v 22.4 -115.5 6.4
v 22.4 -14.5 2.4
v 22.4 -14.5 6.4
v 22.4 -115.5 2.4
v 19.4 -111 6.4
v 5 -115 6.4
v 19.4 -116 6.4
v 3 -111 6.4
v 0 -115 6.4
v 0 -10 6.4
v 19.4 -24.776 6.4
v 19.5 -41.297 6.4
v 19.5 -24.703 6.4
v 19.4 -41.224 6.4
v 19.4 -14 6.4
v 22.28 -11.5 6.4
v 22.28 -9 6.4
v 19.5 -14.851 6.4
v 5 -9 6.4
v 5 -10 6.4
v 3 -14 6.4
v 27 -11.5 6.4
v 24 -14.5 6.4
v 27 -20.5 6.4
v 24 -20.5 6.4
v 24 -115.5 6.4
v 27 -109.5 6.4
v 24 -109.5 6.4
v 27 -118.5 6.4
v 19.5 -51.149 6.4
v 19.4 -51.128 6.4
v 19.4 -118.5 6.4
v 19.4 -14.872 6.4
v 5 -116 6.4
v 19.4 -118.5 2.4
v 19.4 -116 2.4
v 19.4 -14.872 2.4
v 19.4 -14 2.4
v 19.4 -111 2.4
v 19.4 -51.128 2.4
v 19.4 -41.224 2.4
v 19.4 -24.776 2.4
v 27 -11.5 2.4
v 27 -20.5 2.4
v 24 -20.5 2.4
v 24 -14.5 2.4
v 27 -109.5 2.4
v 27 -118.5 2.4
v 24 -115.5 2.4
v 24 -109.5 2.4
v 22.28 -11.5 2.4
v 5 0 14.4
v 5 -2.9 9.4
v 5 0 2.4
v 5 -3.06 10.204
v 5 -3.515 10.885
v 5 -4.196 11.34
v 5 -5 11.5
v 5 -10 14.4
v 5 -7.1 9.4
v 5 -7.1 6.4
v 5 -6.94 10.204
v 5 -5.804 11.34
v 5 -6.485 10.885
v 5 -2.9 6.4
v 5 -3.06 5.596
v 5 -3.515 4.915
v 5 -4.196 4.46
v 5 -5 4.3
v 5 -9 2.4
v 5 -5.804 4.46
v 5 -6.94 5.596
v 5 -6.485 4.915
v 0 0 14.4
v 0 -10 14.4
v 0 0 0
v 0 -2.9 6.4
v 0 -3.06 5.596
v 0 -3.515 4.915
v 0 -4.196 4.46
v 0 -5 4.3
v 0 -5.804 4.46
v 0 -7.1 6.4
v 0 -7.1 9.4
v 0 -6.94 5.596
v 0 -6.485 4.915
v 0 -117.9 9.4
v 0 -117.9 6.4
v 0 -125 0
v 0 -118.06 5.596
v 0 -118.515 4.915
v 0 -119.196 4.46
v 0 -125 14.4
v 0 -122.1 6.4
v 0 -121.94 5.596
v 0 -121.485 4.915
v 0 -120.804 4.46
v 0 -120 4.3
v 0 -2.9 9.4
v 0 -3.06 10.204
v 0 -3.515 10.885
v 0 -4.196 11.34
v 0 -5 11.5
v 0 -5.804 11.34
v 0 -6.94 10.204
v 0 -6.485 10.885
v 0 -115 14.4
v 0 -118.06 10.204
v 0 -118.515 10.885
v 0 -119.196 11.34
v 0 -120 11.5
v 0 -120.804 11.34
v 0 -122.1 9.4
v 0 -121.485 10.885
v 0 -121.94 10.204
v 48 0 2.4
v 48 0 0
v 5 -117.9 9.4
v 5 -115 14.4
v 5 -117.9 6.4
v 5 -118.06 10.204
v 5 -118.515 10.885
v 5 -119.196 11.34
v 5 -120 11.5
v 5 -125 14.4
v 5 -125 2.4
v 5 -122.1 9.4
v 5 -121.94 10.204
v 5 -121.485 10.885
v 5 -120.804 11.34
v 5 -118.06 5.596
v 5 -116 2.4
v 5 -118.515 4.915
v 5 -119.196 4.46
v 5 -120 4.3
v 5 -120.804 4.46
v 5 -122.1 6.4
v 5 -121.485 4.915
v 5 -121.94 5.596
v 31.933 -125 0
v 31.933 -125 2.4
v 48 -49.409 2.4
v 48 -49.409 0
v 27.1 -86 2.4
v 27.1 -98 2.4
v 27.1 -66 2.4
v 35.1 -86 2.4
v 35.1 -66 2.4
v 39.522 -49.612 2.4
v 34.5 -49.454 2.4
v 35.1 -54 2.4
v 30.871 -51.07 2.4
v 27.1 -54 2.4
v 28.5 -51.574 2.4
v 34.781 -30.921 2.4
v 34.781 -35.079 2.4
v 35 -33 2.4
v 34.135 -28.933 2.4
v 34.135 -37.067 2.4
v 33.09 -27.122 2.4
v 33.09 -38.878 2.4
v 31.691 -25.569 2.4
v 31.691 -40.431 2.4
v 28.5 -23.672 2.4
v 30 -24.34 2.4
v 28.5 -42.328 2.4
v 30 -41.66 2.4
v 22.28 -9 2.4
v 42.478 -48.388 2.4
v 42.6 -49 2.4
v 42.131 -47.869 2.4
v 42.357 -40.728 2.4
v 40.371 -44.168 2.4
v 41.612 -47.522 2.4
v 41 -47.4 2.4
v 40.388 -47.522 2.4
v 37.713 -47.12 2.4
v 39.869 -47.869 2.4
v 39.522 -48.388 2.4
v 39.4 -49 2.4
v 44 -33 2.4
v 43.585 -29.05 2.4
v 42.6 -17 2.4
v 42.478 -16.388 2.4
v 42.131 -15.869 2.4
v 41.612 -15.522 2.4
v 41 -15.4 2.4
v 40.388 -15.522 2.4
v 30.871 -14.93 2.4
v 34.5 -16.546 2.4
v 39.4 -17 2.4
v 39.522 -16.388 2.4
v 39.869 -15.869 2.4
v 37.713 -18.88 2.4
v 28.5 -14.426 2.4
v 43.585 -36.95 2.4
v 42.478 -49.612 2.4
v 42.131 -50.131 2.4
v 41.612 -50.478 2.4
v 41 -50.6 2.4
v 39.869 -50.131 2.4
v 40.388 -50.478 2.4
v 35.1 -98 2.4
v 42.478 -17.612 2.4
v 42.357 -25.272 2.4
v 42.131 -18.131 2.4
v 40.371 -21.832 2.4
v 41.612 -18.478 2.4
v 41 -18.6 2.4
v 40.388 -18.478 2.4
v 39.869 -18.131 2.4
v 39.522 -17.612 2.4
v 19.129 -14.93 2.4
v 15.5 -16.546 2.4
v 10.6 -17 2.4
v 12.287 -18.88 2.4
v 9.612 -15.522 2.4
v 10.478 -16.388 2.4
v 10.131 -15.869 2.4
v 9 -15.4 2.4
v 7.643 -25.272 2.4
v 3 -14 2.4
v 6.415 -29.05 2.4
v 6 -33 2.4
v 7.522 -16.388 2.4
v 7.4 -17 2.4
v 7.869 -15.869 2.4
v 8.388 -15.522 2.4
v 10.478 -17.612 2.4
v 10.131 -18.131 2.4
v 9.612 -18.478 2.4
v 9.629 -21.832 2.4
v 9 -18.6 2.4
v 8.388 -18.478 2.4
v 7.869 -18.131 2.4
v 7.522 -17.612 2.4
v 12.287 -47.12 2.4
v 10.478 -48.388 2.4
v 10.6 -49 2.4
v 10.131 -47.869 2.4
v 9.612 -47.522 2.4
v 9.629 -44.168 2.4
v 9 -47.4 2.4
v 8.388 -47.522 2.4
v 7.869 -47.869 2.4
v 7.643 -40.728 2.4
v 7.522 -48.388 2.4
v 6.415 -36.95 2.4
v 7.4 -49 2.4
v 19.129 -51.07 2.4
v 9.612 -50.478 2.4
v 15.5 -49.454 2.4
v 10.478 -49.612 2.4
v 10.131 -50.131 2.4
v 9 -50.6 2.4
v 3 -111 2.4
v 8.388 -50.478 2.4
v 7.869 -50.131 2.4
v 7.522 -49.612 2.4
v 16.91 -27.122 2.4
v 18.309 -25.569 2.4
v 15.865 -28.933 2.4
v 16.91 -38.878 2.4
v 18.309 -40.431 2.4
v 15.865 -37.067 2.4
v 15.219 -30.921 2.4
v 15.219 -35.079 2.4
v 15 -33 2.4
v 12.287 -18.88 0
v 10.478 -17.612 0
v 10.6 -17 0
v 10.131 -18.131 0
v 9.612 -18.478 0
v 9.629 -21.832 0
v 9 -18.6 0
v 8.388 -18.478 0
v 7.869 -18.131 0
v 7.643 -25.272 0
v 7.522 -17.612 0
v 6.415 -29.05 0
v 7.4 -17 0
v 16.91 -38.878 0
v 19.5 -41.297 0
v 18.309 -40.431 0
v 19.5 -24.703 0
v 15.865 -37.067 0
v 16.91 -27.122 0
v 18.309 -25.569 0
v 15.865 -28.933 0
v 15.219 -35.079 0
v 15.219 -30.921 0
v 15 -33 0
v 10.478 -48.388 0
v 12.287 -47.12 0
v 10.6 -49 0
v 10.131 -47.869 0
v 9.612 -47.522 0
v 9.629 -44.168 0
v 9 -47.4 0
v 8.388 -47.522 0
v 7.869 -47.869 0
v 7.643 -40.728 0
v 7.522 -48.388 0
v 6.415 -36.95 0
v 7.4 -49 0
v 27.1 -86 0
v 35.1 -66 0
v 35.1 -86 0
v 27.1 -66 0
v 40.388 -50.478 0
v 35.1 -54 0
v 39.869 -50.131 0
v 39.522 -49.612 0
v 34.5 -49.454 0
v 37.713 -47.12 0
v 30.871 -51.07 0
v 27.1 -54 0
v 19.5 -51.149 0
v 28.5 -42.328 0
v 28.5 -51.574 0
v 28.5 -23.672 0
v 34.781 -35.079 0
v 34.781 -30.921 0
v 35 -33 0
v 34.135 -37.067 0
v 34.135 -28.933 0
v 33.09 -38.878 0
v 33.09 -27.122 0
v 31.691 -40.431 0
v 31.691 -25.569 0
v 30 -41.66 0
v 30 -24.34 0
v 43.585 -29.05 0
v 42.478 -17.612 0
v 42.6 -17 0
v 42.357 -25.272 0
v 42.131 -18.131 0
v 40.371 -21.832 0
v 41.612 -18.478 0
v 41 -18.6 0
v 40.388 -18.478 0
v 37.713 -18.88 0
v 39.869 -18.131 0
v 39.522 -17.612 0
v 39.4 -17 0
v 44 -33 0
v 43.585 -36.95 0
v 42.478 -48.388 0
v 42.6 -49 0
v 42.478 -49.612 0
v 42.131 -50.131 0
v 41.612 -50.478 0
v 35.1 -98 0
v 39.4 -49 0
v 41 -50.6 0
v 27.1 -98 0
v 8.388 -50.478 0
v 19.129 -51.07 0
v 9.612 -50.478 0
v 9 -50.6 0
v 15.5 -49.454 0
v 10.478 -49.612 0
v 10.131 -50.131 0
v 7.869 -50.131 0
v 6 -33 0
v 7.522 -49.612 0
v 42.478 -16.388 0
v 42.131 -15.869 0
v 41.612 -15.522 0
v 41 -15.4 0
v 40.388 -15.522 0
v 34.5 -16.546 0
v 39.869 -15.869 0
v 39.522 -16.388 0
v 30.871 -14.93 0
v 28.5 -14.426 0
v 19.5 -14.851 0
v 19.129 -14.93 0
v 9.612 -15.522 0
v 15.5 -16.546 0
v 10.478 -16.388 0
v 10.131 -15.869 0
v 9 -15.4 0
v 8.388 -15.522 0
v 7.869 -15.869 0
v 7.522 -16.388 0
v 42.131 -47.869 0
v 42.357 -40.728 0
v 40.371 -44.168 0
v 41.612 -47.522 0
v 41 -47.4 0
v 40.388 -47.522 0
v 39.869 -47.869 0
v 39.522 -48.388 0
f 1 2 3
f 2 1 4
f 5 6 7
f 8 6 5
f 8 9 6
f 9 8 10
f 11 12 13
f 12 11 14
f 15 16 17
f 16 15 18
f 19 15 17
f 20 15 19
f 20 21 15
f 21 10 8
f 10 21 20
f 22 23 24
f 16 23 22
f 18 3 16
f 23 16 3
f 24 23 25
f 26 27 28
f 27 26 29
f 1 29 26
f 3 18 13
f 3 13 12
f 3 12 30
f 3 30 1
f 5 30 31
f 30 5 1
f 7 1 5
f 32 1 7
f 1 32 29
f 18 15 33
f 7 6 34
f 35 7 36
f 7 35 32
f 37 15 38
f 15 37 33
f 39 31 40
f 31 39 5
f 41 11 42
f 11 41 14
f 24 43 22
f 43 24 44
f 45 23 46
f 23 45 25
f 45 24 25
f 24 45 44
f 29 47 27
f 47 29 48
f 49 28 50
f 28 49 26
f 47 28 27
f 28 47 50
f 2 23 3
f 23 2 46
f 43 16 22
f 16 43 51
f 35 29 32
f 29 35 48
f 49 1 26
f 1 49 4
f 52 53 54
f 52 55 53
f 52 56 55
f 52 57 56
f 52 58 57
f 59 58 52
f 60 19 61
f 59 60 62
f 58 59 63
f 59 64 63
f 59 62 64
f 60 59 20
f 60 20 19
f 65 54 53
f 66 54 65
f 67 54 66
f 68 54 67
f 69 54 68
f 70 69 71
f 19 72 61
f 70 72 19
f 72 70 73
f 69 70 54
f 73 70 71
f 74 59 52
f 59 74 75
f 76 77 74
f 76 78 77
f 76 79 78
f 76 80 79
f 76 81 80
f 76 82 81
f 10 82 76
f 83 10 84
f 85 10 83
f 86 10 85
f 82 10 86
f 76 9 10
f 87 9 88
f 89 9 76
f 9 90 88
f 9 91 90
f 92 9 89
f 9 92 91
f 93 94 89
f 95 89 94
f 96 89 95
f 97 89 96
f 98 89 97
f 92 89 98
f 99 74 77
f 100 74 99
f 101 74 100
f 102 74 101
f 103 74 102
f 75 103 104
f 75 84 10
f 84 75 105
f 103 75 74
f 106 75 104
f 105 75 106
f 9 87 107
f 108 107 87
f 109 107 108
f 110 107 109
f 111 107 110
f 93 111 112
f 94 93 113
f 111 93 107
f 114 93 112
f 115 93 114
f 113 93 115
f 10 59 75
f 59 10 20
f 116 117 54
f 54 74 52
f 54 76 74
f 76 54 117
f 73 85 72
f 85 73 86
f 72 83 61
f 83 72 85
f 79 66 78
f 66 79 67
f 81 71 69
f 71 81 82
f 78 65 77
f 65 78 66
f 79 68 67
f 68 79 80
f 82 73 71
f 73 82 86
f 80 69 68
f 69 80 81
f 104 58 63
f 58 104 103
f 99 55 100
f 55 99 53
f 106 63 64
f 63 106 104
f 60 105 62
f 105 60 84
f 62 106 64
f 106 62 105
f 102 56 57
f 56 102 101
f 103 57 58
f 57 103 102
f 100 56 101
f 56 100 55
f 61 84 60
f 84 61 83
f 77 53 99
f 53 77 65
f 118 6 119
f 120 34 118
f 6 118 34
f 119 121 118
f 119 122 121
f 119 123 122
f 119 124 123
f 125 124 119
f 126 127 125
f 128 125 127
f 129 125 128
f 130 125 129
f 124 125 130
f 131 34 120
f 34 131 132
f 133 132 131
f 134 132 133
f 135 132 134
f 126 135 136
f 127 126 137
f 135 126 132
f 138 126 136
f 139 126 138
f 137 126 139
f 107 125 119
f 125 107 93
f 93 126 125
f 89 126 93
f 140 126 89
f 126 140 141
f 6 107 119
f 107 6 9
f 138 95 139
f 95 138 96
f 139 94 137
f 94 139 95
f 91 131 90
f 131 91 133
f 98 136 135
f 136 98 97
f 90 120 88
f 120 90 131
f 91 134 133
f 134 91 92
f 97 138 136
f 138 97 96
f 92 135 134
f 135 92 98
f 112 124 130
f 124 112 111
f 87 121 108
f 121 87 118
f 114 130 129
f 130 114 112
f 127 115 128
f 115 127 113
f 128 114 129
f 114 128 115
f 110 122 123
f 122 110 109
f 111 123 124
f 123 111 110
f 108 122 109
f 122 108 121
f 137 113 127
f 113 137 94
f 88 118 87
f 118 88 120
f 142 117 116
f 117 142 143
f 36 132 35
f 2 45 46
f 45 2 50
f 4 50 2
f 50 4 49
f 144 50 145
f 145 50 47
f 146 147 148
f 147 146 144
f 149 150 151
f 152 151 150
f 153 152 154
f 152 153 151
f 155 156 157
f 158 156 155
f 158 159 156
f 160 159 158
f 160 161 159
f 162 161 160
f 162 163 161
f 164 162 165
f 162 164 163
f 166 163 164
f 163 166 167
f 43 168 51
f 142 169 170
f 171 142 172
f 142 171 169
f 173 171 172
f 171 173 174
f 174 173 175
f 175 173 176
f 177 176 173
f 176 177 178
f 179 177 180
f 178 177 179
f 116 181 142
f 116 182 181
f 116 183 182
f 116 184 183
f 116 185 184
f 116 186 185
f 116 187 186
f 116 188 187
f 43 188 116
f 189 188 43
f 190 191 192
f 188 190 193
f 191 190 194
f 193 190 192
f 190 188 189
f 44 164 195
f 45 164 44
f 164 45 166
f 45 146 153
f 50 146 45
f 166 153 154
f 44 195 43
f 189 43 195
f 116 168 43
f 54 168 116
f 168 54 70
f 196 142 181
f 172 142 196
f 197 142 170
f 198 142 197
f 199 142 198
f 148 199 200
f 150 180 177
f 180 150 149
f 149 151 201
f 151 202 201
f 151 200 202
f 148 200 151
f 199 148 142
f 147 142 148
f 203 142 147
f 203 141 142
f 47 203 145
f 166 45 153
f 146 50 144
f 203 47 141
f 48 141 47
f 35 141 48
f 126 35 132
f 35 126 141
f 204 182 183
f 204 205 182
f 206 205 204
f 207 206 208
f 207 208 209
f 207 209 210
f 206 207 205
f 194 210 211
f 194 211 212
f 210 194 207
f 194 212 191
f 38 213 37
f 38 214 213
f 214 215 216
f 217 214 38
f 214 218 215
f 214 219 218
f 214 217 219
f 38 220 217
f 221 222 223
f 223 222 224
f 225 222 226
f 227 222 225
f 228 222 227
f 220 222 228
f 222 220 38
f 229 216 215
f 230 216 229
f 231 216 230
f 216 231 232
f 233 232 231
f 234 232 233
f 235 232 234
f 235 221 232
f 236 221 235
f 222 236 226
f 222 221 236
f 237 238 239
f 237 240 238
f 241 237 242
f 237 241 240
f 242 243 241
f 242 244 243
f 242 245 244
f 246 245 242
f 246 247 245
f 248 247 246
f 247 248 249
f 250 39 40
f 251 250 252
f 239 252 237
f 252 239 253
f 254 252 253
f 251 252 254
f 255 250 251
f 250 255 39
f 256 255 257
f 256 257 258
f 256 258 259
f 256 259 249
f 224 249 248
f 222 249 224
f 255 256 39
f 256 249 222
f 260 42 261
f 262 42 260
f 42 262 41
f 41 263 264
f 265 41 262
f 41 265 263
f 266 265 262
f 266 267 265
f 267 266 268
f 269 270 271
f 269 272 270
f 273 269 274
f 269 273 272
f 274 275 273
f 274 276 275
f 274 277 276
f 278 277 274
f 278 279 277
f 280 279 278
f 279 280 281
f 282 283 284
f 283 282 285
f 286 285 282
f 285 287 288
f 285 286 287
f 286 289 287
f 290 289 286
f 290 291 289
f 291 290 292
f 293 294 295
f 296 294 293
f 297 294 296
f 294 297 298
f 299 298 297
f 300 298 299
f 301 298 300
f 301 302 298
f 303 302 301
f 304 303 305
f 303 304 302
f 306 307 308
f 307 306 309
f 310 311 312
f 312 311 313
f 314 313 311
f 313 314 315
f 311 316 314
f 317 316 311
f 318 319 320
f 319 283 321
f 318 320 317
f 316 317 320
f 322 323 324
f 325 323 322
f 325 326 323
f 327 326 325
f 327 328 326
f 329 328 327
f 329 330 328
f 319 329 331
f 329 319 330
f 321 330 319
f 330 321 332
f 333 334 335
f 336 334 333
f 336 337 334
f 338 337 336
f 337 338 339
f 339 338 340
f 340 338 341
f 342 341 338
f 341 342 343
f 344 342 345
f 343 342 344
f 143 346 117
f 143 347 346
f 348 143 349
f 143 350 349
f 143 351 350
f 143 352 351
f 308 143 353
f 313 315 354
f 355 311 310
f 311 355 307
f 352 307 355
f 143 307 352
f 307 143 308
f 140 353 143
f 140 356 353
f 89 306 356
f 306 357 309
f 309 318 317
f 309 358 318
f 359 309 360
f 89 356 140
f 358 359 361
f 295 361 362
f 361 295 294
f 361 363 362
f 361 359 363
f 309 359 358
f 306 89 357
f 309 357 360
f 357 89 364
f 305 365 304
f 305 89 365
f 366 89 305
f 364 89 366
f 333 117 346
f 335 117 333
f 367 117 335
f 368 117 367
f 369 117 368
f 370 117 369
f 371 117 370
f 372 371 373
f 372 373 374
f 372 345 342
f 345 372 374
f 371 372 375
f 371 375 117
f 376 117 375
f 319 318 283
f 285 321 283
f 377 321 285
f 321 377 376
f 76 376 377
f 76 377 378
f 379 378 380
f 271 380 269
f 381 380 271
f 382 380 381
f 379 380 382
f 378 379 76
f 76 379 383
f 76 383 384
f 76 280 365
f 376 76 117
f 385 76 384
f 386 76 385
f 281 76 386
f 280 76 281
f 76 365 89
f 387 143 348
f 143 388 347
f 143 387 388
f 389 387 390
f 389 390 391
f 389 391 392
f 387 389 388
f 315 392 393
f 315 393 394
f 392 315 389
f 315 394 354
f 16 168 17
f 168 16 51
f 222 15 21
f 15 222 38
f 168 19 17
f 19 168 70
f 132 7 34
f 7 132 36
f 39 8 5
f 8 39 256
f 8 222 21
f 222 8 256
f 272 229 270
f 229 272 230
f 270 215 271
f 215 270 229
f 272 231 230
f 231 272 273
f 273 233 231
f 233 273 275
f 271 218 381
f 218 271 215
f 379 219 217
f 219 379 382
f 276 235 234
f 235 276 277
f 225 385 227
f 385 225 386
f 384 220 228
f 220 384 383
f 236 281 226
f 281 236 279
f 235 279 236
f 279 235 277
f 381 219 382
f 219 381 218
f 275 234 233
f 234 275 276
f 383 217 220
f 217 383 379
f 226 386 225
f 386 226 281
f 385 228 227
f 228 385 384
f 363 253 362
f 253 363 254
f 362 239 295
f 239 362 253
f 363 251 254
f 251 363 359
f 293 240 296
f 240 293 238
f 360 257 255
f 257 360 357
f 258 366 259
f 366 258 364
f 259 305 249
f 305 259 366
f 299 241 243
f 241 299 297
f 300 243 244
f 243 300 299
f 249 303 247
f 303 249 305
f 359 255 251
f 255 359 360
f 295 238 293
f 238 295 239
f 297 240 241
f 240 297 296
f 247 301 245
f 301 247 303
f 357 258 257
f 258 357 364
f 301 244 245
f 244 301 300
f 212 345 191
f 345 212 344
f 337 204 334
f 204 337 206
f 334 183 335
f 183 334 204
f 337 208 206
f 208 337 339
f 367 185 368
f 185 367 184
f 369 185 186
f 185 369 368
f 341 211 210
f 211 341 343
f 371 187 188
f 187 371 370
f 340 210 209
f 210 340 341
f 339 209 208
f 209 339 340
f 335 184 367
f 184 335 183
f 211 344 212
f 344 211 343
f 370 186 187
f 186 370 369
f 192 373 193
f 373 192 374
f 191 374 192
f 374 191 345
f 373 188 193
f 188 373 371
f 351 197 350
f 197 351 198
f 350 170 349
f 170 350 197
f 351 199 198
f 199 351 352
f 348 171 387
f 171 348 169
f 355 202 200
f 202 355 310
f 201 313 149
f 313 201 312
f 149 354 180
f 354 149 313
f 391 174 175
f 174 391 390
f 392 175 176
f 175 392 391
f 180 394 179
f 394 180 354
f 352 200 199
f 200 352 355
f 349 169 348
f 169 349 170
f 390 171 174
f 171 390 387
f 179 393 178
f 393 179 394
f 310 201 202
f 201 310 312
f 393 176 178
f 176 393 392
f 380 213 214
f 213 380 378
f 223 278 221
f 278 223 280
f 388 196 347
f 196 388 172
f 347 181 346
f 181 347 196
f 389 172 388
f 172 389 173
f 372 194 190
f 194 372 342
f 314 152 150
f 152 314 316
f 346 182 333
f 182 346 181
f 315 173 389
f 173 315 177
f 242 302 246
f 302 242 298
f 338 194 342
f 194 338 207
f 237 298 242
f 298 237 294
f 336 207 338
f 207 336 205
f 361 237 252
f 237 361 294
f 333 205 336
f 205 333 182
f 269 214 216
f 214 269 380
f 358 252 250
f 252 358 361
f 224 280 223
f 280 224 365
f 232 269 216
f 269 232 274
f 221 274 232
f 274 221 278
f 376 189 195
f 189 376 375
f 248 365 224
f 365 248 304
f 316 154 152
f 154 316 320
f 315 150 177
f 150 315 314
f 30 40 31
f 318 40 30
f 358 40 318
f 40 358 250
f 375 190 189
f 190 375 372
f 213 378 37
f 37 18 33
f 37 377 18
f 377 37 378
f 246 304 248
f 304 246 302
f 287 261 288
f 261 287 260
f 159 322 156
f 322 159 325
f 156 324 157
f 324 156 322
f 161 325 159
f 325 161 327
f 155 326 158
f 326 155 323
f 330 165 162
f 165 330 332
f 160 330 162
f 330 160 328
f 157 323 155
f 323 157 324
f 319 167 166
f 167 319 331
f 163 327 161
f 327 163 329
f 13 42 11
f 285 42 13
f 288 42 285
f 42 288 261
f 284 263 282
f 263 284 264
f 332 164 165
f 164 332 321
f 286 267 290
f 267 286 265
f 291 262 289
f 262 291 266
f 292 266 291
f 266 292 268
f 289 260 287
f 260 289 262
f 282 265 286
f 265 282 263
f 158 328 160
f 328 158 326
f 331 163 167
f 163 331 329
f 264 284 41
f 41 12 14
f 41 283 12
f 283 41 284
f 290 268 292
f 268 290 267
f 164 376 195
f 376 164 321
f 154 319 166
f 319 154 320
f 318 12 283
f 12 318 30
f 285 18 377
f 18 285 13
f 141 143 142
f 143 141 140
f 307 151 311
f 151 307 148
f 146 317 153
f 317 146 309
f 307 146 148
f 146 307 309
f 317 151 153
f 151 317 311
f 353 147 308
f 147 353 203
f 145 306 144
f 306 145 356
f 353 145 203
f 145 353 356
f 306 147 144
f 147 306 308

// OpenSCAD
// Fan and Duet read board holder for 2020 Kossel

thickness=2.4;
leftMargin=10;
rightMargin=15;
ribThickness=3;
ribHeight=4;
pcbThick=1.6;
pcbClear=0.1;
pcbWidth=100;
pcbWclear=0.5;
pcbOffset=24;
m3ClearRad=1.6;
m4ClearRad=2.1;
overlap=0.02;

module duetRibs() {
	translate([-pcbThick-ribThickness,-overlap-pcbWclear,thickness-overlap])
		cube([ribThickness,pcbWidth+2*pcbWclear+2*overlap,ribHeight+overlap]);

	translate([0,-overlap-pcbWclear,thickness-overlap])
		cube([ribThickness,6+overlap,ribHeight+overlap]);
	translate([0,pcbWidth+pcbWclear-6,thickness-overlap])
		cube([ribThickness,6+overlap,ribHeight+overlap]);

	translate([-ribThickness-pcbThick,-ribThickness-pcbWclear,thickness-overlap])
		cube([pcbThick+2*ribThickness,ribThickness,ribHeight+overlap]);
	translate([-ribThickness-pcbThick,pcbWidth+pcbWclear,thickness-overlap])
		cube([pcbThick+2*ribThickness,ribThickness,ribHeight+overlap]);
}

module foot() {
	difference() {
		translate([0,0,thickness-overlap]) cube([5,10,12+overlap]);
		translate([-overlap,5,thickness+4])
			rotate([0,90,0])
				cylinder(r=m4ClearRad,h=10,$fn=16);
		translate([-overlap,5,thickness+7])
			rotate([0,90,0])
				cylinder(r=m4ClearRad,h=10,$fn=16);
		translate([-overlap,5,thickness+5.5])
			cube([20,2*m4ClearRad,3],center=true);
	}
}

module supportRib() {
	cube([pcbOffset-pcbThick-pcbClear-overlap,5,ribHeight+overlap]);
}

module fanCutouts() {
	translate([0,0,-overlap])
		difference() {
			union() {
				cylinder(r=19,h=10);
				for(x=[-16,16])
					for(y=[-16,16])
						translate([x,y,-overlap]) cylinder(r=m3ClearRad,h=20,$fn=16);
			}
			translate([0,0,-overlap]) cylinder(r=10,h=10);
			translate([-1,0,-overlap]) cube([9,100,20], center=true);
		}
}

module terminalCutout() {
	cube([8,12,20],center=true);
}

mirror([0,1,0])
difference() {
	union() {
		cube([48,pcbWidth+leftMargin+rightMargin,thickness]);
		translate([pcbOffset,rightMargin,0]) duetRibs();
		foot();
		translate([0,pcbWidth+leftMargin+rightMargin-10,0]) foot();
		translate([0,10-1,thickness-overlap]) supportRib();
		translate([0,pcbWidth+leftMargin+rightMargin-10-5+1,thickness-overlap])
			supportRib();	
		translate([0,10-overlap,thickness-overlap])
			cube([ribThickness,pcbWidth+leftMargin+rightMargin-20+2*overlap,ribHeight+overlap]);
	}
	translate([25,rightMargin+18,0]) fanCutouts();
	translate([50,40,-overlap]) rotate([0,0,12]) cube([200,200,10]);
	translate([pcbOffset+pcbClear+7,rightMargin+45,0]) terminalCutout();
	translate([pcbOffset+pcbClear+7,rightMargin+77,0]) terminalCutout();
}
